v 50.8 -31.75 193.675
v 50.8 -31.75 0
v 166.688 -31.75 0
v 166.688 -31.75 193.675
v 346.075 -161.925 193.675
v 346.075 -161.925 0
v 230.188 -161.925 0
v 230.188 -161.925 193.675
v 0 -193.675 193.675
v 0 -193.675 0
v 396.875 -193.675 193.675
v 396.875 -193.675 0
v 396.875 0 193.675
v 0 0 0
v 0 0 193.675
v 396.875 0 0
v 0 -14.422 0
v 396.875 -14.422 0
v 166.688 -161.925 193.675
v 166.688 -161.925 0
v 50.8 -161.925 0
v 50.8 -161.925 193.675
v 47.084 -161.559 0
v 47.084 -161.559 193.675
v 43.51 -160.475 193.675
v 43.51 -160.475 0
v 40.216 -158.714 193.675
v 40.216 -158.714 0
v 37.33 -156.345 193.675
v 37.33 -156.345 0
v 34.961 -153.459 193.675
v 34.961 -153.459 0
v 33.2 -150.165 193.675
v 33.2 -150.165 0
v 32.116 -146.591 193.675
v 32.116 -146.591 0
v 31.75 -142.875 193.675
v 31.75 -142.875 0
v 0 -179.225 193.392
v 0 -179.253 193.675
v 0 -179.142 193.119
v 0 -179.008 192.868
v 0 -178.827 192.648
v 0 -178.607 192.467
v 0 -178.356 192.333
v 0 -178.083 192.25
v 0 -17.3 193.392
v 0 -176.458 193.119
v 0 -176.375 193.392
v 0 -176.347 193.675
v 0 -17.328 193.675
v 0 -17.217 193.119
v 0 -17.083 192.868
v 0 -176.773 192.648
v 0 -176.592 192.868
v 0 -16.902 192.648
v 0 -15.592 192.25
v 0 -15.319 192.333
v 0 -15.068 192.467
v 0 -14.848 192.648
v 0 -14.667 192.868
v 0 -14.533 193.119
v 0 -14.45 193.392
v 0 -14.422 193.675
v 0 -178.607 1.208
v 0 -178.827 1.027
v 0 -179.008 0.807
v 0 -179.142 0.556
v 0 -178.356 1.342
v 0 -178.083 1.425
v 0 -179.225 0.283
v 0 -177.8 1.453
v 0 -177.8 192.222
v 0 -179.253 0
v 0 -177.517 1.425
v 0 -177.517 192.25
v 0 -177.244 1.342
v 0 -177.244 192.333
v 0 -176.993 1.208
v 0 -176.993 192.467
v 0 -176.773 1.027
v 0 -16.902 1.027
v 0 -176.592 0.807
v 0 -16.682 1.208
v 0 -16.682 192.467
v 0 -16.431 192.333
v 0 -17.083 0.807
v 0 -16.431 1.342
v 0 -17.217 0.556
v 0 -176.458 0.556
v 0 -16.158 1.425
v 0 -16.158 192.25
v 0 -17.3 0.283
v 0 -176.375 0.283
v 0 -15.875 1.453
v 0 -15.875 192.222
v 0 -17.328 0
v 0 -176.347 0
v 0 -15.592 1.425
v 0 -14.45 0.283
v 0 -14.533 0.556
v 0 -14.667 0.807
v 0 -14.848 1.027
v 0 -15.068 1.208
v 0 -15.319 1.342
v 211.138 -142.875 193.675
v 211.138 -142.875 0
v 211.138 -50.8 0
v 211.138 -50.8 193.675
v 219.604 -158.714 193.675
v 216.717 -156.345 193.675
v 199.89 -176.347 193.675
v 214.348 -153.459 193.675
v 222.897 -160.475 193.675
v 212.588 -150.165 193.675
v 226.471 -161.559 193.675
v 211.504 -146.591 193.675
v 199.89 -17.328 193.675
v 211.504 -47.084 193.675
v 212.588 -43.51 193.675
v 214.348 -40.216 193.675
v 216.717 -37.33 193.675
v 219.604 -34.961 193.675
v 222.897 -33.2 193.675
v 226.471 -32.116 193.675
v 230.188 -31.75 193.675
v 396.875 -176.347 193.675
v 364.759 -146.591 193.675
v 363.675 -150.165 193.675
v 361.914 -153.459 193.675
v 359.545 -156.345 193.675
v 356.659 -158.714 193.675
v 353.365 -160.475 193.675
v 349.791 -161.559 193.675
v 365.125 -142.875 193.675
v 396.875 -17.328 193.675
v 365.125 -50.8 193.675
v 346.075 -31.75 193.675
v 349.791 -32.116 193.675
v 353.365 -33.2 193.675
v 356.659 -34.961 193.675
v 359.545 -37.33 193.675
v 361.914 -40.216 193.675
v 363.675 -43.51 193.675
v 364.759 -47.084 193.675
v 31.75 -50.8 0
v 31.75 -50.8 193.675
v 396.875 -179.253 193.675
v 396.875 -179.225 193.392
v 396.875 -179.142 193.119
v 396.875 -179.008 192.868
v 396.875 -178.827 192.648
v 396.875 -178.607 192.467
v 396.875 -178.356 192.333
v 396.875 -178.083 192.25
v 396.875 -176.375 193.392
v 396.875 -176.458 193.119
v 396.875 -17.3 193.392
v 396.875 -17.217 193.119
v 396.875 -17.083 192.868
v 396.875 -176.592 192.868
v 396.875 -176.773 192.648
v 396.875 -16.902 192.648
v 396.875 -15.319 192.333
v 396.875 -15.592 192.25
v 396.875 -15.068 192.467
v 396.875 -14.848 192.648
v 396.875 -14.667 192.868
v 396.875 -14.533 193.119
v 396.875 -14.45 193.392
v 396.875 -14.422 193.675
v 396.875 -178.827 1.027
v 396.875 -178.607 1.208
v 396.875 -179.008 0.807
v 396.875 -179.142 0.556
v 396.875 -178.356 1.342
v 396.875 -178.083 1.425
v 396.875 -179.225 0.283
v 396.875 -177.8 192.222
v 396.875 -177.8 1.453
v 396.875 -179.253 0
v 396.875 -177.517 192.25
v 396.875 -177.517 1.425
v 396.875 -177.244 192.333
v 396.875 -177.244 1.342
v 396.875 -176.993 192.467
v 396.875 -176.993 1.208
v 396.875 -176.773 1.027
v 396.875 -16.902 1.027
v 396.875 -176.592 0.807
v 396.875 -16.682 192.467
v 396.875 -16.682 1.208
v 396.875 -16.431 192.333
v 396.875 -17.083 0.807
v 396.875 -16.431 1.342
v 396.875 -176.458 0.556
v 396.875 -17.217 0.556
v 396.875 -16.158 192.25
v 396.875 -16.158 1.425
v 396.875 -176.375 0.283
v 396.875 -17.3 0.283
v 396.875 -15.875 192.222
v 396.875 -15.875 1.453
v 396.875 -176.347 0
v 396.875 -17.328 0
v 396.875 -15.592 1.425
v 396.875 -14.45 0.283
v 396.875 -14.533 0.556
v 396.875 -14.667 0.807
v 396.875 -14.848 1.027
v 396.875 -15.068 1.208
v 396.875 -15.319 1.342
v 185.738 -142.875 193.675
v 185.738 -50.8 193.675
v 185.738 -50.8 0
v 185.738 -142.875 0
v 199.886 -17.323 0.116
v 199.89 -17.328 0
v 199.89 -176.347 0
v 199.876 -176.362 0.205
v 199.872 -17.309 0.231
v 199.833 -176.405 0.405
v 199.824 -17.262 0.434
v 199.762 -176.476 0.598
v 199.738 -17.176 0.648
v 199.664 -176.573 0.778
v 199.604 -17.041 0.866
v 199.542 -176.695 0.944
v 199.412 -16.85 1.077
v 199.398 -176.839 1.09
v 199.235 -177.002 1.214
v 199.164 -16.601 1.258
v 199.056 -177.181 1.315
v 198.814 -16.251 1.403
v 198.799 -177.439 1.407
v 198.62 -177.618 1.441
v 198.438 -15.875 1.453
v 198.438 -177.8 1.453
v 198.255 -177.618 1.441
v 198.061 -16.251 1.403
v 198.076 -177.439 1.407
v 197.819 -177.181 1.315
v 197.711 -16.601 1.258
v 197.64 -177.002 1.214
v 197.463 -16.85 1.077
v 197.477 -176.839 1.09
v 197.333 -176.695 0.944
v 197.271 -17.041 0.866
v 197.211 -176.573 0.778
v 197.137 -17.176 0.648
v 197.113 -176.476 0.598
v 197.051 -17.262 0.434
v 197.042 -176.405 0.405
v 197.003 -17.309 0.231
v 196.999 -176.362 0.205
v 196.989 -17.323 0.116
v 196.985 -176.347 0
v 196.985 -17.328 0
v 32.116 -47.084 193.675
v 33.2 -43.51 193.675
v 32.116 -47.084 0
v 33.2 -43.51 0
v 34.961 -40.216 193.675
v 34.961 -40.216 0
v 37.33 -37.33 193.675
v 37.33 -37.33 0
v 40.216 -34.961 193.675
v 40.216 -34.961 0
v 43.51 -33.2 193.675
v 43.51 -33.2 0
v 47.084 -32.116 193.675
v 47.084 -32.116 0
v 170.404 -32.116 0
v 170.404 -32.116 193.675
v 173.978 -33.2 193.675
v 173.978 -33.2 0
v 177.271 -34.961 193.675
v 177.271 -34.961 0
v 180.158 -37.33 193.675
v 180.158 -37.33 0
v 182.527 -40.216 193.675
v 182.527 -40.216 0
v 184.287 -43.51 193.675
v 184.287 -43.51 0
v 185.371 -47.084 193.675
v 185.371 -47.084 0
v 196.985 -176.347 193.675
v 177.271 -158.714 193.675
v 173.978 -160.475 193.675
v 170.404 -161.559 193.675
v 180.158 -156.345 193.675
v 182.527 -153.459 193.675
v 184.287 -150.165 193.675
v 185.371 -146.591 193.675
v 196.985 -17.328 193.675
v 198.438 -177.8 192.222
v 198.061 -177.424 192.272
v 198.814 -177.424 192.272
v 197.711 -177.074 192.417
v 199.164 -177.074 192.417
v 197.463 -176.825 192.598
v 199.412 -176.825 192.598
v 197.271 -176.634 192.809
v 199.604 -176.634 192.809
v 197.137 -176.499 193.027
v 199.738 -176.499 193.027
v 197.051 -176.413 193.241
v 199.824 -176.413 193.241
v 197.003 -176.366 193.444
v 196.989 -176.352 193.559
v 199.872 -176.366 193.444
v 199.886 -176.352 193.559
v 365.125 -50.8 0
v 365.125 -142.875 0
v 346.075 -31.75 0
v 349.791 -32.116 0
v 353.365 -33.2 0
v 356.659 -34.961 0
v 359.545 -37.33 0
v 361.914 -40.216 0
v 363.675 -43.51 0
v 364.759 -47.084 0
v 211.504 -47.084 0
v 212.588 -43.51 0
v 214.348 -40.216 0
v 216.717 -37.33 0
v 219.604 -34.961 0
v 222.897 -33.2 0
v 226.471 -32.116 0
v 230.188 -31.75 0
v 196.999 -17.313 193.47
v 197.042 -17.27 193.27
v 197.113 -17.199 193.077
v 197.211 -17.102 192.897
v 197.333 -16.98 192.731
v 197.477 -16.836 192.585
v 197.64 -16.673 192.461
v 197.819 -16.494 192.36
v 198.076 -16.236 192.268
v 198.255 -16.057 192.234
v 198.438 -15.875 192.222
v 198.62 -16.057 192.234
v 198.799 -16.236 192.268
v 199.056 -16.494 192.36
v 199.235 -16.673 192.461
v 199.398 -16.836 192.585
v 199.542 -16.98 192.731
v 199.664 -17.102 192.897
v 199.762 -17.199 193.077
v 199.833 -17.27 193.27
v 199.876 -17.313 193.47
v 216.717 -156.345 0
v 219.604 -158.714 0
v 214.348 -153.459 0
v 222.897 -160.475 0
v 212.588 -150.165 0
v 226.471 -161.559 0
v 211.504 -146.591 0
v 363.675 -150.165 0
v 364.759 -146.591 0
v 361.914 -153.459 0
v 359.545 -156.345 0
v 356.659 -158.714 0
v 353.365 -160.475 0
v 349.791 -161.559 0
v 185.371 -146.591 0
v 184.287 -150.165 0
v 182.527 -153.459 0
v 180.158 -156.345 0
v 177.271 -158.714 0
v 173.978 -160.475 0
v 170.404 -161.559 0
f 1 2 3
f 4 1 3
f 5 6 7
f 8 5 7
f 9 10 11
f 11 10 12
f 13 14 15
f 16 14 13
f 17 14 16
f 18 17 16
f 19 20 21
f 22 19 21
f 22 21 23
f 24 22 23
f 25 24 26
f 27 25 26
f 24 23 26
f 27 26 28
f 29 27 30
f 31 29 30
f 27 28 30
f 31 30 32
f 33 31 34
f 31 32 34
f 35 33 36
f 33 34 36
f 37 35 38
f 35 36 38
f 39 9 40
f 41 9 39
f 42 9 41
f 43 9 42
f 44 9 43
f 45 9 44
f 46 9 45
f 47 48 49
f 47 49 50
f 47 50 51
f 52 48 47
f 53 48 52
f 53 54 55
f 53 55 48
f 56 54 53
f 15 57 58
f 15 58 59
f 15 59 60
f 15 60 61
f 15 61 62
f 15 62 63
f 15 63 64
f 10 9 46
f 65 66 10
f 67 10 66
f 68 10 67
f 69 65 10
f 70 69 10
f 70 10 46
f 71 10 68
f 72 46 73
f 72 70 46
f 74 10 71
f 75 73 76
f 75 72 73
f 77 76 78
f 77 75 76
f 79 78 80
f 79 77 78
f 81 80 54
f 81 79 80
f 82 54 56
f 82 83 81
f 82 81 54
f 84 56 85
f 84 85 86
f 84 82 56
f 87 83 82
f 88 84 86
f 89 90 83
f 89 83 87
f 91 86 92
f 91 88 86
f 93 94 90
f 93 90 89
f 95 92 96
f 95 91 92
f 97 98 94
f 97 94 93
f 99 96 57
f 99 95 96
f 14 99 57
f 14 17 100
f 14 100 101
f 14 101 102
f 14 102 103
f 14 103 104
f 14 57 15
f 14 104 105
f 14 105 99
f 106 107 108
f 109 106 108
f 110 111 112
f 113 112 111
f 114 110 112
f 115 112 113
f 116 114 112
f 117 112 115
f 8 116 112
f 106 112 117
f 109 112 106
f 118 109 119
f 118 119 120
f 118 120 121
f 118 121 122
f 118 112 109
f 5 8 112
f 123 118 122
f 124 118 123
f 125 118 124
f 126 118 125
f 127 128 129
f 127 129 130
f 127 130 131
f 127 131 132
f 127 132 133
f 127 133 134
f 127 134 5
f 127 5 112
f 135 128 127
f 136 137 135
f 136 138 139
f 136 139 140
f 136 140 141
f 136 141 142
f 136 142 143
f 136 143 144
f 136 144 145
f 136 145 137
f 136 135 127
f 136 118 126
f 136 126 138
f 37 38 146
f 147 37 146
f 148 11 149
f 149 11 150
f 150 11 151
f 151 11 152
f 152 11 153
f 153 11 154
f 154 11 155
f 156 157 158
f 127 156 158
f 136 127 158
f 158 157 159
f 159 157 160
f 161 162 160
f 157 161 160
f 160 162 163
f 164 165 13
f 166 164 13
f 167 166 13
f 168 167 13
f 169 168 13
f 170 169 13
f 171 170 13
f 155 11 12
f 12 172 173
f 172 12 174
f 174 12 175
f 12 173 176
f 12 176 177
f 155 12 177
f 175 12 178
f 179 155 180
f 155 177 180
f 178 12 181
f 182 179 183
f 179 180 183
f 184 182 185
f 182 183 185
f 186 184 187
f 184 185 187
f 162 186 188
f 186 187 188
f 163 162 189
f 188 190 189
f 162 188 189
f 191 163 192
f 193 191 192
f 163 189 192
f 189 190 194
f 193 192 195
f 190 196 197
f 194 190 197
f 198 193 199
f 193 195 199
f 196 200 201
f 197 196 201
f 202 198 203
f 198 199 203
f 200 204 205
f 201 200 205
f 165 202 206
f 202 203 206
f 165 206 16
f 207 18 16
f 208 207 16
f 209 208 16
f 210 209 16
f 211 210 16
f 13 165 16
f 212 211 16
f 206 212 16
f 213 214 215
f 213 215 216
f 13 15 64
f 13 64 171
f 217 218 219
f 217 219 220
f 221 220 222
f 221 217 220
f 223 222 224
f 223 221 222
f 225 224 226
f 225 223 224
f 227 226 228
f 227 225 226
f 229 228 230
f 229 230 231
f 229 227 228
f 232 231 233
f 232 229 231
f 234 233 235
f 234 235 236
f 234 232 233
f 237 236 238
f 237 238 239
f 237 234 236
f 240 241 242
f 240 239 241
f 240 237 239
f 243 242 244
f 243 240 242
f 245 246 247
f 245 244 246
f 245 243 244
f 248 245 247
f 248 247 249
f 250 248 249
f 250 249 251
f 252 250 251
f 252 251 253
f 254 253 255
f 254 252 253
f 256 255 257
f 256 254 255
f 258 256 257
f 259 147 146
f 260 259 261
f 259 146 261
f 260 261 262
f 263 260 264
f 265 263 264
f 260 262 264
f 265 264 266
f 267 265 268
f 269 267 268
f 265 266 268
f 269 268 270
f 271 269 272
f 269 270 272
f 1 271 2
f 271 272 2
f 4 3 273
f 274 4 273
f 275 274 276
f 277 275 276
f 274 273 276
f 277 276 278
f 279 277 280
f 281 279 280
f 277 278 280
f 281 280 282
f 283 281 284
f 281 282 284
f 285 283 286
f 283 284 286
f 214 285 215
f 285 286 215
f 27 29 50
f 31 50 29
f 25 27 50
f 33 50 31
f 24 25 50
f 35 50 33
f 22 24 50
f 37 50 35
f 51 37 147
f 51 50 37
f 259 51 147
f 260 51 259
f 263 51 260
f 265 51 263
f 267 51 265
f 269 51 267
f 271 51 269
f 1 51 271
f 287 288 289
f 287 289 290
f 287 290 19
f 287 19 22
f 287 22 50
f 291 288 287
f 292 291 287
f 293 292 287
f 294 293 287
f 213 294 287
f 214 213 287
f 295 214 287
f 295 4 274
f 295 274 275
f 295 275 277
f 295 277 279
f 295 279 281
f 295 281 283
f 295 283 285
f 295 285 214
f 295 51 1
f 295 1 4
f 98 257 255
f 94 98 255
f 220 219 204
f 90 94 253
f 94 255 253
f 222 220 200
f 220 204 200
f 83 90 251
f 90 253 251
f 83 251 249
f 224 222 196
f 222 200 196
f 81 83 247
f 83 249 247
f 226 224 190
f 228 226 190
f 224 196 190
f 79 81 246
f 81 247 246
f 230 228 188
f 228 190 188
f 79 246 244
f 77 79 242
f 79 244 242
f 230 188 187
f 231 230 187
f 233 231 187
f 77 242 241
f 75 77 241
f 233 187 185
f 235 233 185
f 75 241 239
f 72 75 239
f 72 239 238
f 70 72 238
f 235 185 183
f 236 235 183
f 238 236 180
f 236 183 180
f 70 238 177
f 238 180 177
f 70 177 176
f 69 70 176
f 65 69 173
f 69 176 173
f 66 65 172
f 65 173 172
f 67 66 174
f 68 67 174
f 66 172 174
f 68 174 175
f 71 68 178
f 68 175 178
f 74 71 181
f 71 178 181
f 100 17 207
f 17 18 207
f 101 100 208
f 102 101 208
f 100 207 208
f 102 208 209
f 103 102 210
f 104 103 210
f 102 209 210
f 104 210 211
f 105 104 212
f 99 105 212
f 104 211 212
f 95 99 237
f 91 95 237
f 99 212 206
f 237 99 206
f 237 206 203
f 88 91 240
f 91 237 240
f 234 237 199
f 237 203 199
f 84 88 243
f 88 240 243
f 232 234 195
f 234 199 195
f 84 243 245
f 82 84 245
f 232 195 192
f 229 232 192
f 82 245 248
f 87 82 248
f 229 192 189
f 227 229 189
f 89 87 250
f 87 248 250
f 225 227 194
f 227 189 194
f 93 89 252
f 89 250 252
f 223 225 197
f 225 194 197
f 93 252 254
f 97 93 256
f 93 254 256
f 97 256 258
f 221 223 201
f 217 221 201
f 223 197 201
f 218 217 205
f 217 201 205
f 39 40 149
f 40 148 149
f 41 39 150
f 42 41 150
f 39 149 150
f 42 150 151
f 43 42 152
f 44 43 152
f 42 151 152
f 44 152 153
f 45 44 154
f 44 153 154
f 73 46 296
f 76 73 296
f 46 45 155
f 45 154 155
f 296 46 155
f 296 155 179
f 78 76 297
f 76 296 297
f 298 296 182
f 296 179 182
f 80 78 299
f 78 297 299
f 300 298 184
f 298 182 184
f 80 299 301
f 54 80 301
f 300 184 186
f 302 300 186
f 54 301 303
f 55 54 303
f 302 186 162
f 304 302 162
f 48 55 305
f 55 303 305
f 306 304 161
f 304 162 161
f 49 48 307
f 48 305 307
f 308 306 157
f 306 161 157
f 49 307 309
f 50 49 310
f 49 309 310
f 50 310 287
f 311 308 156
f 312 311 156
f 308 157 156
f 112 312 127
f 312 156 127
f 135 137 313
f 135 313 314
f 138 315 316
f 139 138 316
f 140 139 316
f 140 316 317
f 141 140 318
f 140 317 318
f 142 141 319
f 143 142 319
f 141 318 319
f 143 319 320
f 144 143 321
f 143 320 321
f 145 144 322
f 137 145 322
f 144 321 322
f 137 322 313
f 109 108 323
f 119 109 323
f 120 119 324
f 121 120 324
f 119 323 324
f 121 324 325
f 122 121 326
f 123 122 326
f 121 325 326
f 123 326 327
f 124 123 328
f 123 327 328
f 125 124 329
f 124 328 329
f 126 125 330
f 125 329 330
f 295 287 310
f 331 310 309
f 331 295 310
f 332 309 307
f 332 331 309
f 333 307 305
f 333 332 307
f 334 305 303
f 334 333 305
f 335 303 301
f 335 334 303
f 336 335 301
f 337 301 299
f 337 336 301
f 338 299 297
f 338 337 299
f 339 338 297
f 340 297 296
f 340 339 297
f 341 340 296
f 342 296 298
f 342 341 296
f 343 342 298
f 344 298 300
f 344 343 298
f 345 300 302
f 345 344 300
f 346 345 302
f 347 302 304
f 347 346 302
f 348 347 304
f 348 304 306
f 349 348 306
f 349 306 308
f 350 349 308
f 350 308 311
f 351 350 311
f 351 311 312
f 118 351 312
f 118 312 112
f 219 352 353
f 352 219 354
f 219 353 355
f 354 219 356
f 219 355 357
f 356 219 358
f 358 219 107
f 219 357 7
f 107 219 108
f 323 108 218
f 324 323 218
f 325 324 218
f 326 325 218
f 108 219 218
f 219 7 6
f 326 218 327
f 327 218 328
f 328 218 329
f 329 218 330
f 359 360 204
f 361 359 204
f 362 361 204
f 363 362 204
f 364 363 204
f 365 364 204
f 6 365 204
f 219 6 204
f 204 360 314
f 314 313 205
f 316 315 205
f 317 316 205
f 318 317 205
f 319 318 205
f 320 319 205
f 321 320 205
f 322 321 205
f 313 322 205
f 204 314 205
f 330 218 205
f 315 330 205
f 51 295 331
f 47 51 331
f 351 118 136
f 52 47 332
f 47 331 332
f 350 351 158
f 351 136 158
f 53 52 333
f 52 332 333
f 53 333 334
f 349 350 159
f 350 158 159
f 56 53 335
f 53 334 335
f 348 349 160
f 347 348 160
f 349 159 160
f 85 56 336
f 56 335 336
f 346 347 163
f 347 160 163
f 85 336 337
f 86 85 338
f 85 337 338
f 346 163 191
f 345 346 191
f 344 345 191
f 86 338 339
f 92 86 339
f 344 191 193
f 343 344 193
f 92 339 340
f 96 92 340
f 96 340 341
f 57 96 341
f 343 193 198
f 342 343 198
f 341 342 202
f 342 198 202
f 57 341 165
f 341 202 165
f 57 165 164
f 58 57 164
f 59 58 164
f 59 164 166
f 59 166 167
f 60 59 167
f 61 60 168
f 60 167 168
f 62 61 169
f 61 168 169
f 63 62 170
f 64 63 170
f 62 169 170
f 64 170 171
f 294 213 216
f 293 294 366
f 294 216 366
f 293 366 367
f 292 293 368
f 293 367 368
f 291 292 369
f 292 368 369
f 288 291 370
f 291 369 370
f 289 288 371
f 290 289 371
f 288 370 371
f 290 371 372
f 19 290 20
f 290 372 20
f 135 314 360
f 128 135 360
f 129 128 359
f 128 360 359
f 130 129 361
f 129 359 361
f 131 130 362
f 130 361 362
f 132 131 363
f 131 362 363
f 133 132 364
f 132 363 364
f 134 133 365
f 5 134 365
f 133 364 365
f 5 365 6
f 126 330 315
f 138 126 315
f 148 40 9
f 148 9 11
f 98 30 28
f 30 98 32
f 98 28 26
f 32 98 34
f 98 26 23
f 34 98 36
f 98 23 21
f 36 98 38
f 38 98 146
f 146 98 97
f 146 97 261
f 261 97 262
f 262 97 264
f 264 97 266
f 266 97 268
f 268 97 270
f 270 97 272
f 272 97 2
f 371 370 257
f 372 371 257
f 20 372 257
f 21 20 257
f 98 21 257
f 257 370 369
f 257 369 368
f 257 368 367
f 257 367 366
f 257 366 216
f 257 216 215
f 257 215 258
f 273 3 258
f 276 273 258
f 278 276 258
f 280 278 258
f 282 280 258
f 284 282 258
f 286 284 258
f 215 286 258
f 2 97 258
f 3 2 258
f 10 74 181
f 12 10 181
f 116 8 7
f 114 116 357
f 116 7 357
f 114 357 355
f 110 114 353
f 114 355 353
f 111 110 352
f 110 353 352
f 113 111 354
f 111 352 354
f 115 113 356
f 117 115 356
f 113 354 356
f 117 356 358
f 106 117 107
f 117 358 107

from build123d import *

# Parameters (mm, degrees)
F0_W     = 396.875
F0_H     = 193.675
F1_DEPTH = 193.675
F3_DEPTH = 396.875
F5_R     = 1.45288
F6_DEPTH = 161.925


with BuildPart() as f1:
    # F0 (on Top) → F1 (new body)
    with BuildSketch(Plane.XY):
        with Locations((198.4375, -96.8375)):
            Rectangle(F0_W, F0_H)
        with BuildLine():
            ThreePointArc((31.75, -50.8), (37.329616, -37.329616), (50.8, -31.75))
            Line((50.8, -31.75), (166.6875, -31.75))
            ThreePointArc((166.6875, -31.75), (180.157884, -37.329616), (185.7375, -50.8))
            Line((185.7375, -50.8), (185.7375, -142.875))
            ThreePointArc((185.7375, -142.875), (180.157884, -156.345384), (166.6875, -161.925))
            Line((166.6875, -161.925), (50.8, -161.925))
            ThreePointArc((50.8, -161.925), (37.329616, -156.345384), (31.75, -142.875))
            Line((31.75, -142.875), (31.75, -50.8))
        make_face(mode=Mode.SUBTRACT)
        with BuildLine():
            ThreePointArc((365.125, -142.875), (359.545384, -156.345384), (346.075, -161.925))
            Line((346.075, -161.925), (230.1875, -161.925))
            ThreePointArc((230.1875, -161.925), (216.717116, -156.345384), (211.1375, -142.875))
            Line((211.1375, -142.875), (211.1375, -50.8))
            ThreePointArc((211.1375, -50.8), (216.717116, -37.329616), (230.1875, -31.75))
            Line((230.1875, -31.75), (346.075, -31.75))
            ThreePointArc((346.075, -31.75), (359.545384, -37.329616), (365.125, -50.8))
            Line((365.125, -50.8), (365.125, -142.875))
        make_face(mode=Mode.SUBTRACT)
    extrude(amount=F1_DEPTH)

    # F2 (on face) → F3 (cut)
    with BuildSketch(Plane.YZ.offset(396.875)):
        with BuildLine():
            ThreePointArc((-179.25288, 193.675), (-177.8, 192.22212), (-176.34712, 193.675))
            Line((-176.34712, 193.675), (-179.25288, 193.675))
        make_face()
        with BuildLine():
            Line((-179.25288, 193.675), (-176.34712, 193.675))
            ThreePointArc((-176.34712, 193.675), (-177.8, 195.12788), (-179.25288, 193.675))
        make_face()
        with BuildLine():
            ThreePointArc((-17.32788, 193.675), (-15.875, 192.22212), (-14.42212, 193.675))
            Line((-14.42212, 193.675), (-17.32788, 193.675))
        make_face()
        with BuildLine():
            Line((-17.32788, 193.675), (-14.42212, 193.675))
            ThreePointArc((-14.42212, 193.675), (-15.875, 195.12788), (-17.32788, 193.675))
        make_face()
        with BuildLine():
            Line((-15.875, 0), (-14.42212, 0))
            ThreePointArc((-14.42212, 0), (-15.875, 1.45288), (-17.32788, 0))
            Line((-17.32788, 0), (-15.875, 0))
        make_face()
        with BuildLine():
            ThreePointArc((-17.32788, 0), (-15.875, -1.45288), (-14.42212, 0))
            Line((-14.42212, 0), (-15.875, 0))
            Line((-15.875, 0), (-17.32788, 0))
        make_face()
        with BuildLine():
            Line((-177.8, 0), (-176.34712, 0))
            ThreePointArc((-176.34712, 0), (-177.8, 1.45288), (-179.25288, 0))
            Line((-179.25288, 0), (-177.8, 0))
        make_face()
        with BuildLine():
            ThreePointArc((-179.25288, 0), (-177.8, -1.45288), (-176.34712, 0))
            Line((-176.34712, 0), (-177.8, 0))
            Line((-177.8, 0), (-179.25288, 0))
        make_face()
    extrude(amount=-F3_DEPTH, mode=Mode.SUBTRACT)

    # F5 (on offset) → F6 (cut)
    with BuildSketch(Plane.XZ.offset(15.875)):
        with BuildLine():
            ThreePointArc((196.98462, 193.675), (198.4375, 192.22212), (199.89038, 193.675))
            ThreePointArc((199.89038, 193.675), (198.4375, 195.12788), (196.98462, 193.675))
        make_face()
        with Locations((198.4375, 0)):
            Circle(F5_R)
    extrude(amount=F6_DEPTH, mode=Mode.SUBTRACT)


solid = f1.part
